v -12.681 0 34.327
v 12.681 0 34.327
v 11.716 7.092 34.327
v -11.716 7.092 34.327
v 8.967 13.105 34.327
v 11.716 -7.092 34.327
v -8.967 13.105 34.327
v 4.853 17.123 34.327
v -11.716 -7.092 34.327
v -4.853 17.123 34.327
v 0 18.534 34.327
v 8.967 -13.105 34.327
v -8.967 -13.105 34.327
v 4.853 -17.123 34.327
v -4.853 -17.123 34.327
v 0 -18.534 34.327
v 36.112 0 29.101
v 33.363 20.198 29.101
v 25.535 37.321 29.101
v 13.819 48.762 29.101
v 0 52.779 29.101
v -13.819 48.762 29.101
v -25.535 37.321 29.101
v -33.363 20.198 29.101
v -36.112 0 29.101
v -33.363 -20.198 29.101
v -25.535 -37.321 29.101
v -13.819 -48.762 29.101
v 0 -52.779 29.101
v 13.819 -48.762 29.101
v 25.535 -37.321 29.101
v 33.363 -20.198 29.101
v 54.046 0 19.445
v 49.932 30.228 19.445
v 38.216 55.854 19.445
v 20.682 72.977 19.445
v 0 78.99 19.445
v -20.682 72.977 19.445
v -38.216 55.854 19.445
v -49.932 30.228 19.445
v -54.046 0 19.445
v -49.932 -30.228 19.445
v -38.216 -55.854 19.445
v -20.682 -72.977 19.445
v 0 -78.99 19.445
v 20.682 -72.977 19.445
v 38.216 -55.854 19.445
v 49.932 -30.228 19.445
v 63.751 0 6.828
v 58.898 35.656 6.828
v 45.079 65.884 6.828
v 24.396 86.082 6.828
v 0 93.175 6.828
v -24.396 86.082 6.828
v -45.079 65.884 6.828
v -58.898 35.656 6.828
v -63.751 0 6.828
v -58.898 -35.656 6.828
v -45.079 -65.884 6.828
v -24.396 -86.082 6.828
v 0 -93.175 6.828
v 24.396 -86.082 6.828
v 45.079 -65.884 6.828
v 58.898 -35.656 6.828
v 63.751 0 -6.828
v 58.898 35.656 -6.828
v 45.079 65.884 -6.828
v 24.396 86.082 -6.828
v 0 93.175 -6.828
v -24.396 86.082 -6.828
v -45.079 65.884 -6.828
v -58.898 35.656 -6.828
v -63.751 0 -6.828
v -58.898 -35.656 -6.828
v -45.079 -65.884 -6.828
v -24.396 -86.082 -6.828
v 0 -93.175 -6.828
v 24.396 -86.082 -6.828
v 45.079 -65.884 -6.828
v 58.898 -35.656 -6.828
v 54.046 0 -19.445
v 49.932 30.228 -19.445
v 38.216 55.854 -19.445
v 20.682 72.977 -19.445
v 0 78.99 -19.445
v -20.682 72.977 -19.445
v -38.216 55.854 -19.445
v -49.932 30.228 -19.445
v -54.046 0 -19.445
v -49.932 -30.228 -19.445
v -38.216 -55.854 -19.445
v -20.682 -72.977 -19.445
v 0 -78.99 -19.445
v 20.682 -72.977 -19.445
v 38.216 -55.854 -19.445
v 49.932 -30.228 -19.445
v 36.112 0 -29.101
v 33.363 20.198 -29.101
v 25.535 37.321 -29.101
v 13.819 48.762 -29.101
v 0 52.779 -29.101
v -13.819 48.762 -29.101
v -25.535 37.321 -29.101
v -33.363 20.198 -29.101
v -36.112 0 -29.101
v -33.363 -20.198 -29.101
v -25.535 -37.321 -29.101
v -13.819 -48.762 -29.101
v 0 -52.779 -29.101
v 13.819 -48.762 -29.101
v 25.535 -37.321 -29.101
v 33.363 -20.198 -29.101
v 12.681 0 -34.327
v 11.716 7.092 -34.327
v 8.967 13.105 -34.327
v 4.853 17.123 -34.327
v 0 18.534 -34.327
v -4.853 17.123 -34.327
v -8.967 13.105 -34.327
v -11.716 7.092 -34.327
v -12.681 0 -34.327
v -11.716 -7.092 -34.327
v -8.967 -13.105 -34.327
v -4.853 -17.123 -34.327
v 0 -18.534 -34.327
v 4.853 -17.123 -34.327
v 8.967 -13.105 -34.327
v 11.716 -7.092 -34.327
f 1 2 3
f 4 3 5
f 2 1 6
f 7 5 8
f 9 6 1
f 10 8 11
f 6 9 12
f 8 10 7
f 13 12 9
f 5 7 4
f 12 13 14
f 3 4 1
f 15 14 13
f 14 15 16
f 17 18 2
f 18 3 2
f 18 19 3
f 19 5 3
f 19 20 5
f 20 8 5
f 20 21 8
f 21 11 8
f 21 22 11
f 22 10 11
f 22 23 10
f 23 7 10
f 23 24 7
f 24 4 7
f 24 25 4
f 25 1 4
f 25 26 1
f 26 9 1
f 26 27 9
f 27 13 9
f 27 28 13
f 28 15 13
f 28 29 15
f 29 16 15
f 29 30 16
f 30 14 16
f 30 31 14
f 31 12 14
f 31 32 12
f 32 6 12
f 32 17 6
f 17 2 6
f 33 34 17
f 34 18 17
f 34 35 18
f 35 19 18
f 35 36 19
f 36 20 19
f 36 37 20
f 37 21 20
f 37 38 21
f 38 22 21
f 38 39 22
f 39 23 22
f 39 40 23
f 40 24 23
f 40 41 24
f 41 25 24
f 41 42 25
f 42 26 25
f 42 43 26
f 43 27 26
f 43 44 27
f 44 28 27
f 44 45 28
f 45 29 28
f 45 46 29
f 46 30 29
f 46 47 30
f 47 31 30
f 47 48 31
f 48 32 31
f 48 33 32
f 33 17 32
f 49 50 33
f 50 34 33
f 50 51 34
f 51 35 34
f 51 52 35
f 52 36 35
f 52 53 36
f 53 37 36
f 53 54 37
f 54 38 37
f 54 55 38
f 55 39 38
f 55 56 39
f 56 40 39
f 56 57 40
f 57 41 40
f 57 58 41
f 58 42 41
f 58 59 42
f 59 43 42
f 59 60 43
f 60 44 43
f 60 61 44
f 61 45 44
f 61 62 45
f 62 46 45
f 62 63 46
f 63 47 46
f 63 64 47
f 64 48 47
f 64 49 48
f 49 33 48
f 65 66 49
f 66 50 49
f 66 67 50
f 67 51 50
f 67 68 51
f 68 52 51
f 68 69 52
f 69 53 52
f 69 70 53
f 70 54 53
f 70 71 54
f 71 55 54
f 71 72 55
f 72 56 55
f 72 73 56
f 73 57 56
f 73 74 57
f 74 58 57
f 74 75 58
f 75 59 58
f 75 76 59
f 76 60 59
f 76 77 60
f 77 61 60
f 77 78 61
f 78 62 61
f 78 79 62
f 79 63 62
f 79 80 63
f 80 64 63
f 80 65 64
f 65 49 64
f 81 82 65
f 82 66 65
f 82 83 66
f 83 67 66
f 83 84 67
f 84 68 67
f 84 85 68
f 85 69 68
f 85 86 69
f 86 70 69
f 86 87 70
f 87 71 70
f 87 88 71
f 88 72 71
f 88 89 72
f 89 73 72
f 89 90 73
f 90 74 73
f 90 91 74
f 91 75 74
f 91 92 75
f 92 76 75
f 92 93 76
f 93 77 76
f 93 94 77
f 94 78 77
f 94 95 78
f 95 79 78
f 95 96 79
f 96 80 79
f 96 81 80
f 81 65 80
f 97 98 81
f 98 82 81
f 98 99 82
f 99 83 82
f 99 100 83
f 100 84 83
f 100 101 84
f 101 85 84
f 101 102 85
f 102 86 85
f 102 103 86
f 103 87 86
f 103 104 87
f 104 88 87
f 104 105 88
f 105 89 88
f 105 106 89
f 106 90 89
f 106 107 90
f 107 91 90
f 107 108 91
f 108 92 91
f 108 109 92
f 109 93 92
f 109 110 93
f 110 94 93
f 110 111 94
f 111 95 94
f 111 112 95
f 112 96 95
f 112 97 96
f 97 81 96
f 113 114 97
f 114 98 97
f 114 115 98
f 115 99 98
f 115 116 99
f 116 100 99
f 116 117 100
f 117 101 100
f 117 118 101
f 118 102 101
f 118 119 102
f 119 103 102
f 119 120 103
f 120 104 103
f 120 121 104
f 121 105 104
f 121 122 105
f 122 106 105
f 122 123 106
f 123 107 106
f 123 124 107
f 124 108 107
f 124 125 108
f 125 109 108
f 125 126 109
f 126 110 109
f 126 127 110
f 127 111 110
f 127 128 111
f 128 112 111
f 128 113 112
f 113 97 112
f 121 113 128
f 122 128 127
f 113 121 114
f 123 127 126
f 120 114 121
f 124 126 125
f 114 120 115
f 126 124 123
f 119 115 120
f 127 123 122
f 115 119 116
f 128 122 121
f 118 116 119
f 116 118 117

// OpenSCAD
// Generated by SolidPython 1.0.1 on 2020-07-29 00:46:51


scale(v = [13, 19, 7]) {
	sphere(r = 5);
}
/***********************************************
*********      SolidPython code:      **********
************************************************
 
# import packages: SolidPython
from solid import *
from solid.utils import *
from itertools import chain, combinations, permutations


class Resize:

    def __init__(self, scad_file):
        self.scad_file = scad_file
        #self.scad_file = import_scad(scad_file)
        # cone/cylinder param:
        self.r1 = 0
        self.r2 = 0
        self.h = 0
        # rectangular prism param:
        self.w = 0
        self.l = 0
        # ellipse param:
        self.r = 0

    # import OpenScad code (file name corresponds to shape)


    # classify shape + parameters
    def assign(self, param1, param2, param3):
        if self.scad_file == 'cone.scad':
            self.r1 = param1
            self.r2 = param2
            self.h = param3
        elif self.scad_file == 'cylinder.scad':
            self.r1 = param1
            self.r2 = param2
            self.h = param3
        elif self.scad_file == 'rectangularPrism.scad':
            self.h = param1
            self.l = param2
            self.w = param3
        else:
            self.r = param1
            self.h = param2

    # resize parameters
    def iterate(self):
        x = range(3, 20, 2)
        i = 1
        if self.scad_file == 'cone.scad':
            tempList = list(permutations(x, 2))
            for temp in tempList:
                param1 = temp[0]
                param2 = temp[1]
                filepath = 'produced_scad_files/' + 'cone' + str(param1) + '_' + str(param2) + '_' + '.scad'
                scad_render_to_file(cylinder(h=param1, r1=param2, r2=0), filepath)

        elif self.scad_file == 'cylinder.scad':
            tempList = list(permutations(x, 3))
            for temp in tempList:
                param1 = temp[0]
                param2 = temp[1]
                filepath = 'produced_scad_files/' + 'cylinder' + str(param1) + '_' + str(param2) + '_' + '.scad'
                scad_render_to_file(cylinder(h=param1, r1=param2, r2=param2), filepath)

        elif self.scad_file == 'rectangularPrism.scad':
            tempList = list(permutations(x, 3))
            for temp in tempList:
                param1 = temp[0]
                param2 = temp[1]
                param3 = temp[2]
                filepath = 'produced_scad_files/' + 'rectangularPrism' + str(param1) + '_' + str(param2) + '_' + str(
                    param3) + '.scad'
                scad_render_to_file(cube(size=(param1, param2, param3)), filepath)

        elif self.scad_file == 'ellipse.scad':
            tempList = list(permutations(x, 4))
            for temp in tempList:
                param1 = temp[0]
                param2 = temp[1]
                param3 = temp[2]
                param4 = temp[3]
                filepath = 'produced_scad_files/' + 'ellipse' + str(param1) + '_' + str(param2) + '_' + str(param3) + '_' + str(param4) + '.scad'
                scad_render_to_file(scale([param1, param2, param3])(sphere(r=param4)), filepath)

    def render_to_scadfile(self):
        scad_render_to_file(scad, 'example.scad') 
 
************************************************/
